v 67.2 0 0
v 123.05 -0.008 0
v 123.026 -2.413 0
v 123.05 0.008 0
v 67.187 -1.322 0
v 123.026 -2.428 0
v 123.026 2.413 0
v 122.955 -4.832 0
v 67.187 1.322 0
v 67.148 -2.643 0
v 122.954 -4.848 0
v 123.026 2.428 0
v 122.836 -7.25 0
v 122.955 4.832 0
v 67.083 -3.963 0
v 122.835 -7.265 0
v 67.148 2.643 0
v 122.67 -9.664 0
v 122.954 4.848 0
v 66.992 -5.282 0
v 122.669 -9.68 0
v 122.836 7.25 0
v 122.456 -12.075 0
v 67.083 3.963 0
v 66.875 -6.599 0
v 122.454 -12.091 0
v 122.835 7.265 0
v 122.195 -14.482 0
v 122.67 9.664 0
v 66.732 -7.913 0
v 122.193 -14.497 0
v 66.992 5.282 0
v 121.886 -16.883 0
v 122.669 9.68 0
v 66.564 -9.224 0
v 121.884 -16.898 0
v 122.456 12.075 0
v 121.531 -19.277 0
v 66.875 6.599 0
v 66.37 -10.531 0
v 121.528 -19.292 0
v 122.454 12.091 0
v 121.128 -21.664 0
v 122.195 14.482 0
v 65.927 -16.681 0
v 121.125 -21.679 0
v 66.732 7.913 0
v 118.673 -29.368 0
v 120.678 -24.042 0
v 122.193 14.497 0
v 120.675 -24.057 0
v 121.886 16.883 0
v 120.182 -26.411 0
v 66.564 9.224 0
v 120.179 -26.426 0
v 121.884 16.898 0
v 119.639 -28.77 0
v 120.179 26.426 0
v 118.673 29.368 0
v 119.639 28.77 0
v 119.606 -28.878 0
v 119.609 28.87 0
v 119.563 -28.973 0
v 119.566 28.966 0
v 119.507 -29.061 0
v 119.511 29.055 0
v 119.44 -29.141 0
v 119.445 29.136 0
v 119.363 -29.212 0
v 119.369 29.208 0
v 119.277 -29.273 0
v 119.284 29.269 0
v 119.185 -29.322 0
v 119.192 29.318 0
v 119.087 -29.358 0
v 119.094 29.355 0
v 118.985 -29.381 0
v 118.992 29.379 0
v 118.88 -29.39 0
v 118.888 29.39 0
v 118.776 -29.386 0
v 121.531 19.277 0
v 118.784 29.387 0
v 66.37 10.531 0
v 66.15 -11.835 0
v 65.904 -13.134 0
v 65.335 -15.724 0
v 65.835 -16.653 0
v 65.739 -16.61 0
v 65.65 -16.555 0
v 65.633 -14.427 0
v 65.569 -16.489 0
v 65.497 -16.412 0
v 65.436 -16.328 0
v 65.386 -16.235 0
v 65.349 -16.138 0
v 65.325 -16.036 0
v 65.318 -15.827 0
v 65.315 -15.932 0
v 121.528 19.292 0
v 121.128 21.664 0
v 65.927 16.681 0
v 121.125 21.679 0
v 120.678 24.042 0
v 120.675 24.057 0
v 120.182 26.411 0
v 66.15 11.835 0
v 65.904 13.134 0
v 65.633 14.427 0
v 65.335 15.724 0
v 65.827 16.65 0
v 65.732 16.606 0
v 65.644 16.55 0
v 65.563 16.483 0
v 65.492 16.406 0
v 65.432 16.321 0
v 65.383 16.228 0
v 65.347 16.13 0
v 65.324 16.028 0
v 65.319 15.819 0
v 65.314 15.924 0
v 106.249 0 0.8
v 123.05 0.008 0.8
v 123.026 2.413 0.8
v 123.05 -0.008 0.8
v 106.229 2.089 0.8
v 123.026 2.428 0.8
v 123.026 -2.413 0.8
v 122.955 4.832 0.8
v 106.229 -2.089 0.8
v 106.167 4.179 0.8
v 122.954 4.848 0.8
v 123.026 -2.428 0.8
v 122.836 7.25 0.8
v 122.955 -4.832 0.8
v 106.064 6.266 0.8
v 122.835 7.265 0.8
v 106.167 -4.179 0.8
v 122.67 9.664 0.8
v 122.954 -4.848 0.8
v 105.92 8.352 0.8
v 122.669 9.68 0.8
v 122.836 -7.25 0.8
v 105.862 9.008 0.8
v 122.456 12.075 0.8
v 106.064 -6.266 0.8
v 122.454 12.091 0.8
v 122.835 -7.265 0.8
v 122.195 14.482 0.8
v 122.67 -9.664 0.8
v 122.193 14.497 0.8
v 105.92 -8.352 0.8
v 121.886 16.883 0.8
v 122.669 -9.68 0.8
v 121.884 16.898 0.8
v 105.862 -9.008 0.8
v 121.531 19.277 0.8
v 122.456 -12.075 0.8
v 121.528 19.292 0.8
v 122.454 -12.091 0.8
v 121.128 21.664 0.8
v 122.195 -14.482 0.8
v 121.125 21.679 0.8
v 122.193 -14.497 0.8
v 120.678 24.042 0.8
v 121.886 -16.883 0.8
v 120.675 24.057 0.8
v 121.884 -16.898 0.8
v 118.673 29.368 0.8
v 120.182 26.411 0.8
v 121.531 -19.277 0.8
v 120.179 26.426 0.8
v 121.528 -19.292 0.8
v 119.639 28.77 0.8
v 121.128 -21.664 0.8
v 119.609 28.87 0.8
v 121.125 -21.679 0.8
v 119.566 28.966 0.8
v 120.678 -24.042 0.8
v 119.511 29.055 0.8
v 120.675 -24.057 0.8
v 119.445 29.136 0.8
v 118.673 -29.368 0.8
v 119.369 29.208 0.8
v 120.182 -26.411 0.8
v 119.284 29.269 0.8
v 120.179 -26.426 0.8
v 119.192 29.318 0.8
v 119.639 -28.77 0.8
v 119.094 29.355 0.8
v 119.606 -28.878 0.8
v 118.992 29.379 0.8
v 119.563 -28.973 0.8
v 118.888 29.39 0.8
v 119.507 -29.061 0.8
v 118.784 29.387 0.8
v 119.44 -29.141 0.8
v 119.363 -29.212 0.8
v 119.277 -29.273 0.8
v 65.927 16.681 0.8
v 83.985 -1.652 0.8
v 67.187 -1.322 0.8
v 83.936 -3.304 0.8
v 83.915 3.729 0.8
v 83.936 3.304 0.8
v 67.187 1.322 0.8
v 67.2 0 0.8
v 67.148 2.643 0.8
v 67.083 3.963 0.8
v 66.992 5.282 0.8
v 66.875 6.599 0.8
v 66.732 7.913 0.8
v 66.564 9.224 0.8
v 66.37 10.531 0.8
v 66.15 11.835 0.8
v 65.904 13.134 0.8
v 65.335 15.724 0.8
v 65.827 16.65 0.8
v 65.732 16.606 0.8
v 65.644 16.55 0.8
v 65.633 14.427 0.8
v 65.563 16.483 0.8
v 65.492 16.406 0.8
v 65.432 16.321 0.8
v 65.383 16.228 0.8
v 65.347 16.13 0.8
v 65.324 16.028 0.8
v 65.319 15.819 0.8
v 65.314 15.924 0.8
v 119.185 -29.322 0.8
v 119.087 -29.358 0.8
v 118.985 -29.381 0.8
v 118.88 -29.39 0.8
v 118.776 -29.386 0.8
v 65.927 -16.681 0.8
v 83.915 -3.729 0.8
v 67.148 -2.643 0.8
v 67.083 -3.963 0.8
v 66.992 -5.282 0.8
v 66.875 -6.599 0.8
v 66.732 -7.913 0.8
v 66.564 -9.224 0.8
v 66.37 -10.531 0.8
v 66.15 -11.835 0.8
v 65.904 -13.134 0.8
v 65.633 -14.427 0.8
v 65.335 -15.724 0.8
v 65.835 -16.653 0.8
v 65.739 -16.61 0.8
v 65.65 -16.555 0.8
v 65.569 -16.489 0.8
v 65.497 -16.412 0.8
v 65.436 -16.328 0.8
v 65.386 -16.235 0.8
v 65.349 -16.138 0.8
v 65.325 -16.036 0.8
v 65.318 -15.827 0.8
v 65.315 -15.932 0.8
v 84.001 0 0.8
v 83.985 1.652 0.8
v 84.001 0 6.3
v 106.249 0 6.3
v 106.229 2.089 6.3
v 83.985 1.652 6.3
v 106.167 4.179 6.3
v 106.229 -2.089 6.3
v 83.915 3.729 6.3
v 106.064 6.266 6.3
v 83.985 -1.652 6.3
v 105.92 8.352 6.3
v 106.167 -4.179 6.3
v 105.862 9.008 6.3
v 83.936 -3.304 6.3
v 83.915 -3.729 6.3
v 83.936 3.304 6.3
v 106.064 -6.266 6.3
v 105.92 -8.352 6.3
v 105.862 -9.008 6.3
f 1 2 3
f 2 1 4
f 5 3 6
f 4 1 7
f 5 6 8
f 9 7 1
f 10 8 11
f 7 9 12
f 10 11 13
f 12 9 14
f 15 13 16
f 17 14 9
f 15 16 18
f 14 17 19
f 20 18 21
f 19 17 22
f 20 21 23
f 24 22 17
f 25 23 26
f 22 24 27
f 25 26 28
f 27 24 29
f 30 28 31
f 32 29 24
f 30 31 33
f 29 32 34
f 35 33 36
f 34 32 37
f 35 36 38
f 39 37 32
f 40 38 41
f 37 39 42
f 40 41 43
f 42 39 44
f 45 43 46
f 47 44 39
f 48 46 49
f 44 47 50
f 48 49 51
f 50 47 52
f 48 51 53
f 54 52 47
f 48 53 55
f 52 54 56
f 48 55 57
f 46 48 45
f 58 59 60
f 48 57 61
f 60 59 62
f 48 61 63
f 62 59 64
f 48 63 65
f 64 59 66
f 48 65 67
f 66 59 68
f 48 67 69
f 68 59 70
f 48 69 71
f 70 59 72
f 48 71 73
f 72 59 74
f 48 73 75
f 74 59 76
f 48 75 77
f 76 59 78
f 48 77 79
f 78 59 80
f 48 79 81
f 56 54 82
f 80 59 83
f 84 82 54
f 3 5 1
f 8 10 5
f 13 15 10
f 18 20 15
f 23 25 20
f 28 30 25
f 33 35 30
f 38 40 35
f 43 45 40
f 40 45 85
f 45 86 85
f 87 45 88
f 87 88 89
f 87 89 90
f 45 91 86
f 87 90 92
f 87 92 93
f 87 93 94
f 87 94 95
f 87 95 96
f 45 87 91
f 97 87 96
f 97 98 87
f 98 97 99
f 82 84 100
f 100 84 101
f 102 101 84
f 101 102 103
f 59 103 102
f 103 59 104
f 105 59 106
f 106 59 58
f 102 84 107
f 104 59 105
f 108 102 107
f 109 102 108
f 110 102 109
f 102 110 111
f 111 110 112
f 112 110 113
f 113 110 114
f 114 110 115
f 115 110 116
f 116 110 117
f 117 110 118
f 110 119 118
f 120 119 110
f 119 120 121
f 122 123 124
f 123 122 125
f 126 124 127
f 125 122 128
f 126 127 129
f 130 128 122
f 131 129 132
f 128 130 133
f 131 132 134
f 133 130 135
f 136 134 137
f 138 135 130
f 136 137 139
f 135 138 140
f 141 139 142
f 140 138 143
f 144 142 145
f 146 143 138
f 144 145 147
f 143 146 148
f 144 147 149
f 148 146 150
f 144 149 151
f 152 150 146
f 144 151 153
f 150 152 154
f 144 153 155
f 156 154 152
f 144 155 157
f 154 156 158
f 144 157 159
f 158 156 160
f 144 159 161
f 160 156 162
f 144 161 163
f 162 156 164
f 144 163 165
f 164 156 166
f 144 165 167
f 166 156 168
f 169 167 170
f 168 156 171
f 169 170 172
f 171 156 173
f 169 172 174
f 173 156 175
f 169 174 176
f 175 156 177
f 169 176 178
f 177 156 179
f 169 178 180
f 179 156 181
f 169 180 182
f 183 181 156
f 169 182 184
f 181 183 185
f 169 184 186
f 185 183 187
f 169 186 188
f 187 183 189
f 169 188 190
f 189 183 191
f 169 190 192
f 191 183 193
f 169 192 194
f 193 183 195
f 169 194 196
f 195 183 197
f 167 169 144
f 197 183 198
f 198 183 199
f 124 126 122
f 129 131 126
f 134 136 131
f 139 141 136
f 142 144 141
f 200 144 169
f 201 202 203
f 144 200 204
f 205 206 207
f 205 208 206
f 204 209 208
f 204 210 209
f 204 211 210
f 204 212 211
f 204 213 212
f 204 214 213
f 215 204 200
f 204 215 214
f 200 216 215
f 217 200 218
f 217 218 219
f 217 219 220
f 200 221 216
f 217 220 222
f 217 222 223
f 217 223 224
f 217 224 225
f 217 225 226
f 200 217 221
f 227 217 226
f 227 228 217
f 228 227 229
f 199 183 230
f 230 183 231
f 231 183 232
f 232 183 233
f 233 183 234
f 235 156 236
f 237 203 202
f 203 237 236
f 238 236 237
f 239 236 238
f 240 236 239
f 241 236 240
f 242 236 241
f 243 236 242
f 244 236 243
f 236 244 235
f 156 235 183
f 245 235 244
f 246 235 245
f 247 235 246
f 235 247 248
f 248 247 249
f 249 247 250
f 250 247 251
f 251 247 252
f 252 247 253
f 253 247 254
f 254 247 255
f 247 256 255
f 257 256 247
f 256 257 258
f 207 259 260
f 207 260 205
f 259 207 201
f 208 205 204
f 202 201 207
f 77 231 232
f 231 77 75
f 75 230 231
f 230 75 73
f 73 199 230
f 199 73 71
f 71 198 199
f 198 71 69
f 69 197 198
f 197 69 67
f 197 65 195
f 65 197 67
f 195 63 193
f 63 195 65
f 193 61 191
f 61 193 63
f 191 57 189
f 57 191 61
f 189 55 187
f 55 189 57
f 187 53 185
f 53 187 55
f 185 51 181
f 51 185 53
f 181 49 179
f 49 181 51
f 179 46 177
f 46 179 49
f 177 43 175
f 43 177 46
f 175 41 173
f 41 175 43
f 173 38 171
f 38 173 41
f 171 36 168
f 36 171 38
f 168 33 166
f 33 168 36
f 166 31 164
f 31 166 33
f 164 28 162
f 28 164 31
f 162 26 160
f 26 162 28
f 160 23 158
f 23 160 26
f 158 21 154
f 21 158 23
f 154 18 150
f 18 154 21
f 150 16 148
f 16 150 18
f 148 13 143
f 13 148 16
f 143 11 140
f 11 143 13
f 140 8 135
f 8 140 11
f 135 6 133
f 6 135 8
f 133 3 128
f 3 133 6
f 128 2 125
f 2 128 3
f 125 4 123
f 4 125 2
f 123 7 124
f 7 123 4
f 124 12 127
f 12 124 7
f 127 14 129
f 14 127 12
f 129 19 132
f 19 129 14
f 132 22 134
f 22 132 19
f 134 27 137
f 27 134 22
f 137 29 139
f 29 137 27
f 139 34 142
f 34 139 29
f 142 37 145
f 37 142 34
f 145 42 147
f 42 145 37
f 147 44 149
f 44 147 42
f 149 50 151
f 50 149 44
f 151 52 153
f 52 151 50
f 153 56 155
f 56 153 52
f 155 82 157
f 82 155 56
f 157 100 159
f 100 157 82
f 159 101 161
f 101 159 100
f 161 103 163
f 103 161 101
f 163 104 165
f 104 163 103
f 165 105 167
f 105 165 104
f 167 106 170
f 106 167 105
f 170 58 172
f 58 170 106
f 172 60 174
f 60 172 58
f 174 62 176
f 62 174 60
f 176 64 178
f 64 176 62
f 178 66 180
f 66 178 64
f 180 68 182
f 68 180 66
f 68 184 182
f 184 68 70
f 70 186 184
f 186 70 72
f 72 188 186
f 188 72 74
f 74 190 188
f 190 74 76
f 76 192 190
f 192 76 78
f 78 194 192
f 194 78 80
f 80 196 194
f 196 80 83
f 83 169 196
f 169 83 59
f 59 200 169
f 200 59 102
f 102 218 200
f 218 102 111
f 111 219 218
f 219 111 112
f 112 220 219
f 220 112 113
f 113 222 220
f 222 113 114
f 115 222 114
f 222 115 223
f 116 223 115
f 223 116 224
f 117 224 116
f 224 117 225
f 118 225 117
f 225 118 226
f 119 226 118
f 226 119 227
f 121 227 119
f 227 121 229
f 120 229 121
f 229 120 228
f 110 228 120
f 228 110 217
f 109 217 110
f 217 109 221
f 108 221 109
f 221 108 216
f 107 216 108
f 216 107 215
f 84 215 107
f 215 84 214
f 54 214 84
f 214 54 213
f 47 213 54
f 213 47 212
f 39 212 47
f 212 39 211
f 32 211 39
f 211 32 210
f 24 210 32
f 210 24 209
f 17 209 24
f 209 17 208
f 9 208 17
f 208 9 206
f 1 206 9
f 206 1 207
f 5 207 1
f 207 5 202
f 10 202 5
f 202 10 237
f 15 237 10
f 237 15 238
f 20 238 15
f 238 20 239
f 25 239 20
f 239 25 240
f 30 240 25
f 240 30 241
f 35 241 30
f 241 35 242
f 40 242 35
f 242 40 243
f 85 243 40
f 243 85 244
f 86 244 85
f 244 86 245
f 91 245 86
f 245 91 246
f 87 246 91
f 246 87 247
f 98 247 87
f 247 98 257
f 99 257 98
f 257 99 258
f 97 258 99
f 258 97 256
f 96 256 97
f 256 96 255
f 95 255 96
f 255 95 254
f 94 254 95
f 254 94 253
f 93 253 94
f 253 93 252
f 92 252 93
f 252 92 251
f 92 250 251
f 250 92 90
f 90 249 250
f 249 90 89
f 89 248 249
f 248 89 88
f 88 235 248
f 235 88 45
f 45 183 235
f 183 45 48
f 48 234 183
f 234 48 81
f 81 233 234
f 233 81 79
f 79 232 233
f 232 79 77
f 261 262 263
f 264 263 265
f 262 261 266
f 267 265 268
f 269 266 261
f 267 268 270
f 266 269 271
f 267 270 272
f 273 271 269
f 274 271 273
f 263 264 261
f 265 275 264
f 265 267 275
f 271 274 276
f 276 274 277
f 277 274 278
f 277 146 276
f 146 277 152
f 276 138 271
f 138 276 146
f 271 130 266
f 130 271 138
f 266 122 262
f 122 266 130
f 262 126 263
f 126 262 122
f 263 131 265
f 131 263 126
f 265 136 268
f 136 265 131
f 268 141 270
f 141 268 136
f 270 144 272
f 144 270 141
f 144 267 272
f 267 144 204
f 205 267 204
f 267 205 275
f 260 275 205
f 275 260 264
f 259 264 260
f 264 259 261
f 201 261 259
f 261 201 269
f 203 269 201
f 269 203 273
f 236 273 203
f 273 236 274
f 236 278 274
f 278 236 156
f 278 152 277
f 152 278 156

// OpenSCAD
// Gen-DF — bobbin BASE (bottom flange + hub). Print x12, flange down. Wind 24 AWG x 240 t around
// the hub with the LID glued on (coil_lid.stl). Copper lives ONLY between the flanges (no proud winds).
include <parameters.scad>;
$fn = 48;
module sector_2d(r_in, r_out, ang) {
    polygon([
        for (a = [-ang/2 : ang/24 : ang/2]) [r_in*cos(a), r_in*sin(a)],
        for (a = [ang/2 : -ang/24 : -ang/2]) [r_out*cos(a), r_out*sin(a)]
    ]);
}
module footprint_2d() { offset(r=wall) sector_2d(coil_id_r, coil_od_r, span_deg); }
module hub_2d()       { offset(delta=-coil_core_inset) sector_2d(coil_id_r, coil_od_r, span_deg); }

union() {
    linear_extrude(flange_t) footprint_2d();
    translate([0, 0, flange_t - 0.01]) linear_extrude(former_web + 0.01) hub_2d();
}
